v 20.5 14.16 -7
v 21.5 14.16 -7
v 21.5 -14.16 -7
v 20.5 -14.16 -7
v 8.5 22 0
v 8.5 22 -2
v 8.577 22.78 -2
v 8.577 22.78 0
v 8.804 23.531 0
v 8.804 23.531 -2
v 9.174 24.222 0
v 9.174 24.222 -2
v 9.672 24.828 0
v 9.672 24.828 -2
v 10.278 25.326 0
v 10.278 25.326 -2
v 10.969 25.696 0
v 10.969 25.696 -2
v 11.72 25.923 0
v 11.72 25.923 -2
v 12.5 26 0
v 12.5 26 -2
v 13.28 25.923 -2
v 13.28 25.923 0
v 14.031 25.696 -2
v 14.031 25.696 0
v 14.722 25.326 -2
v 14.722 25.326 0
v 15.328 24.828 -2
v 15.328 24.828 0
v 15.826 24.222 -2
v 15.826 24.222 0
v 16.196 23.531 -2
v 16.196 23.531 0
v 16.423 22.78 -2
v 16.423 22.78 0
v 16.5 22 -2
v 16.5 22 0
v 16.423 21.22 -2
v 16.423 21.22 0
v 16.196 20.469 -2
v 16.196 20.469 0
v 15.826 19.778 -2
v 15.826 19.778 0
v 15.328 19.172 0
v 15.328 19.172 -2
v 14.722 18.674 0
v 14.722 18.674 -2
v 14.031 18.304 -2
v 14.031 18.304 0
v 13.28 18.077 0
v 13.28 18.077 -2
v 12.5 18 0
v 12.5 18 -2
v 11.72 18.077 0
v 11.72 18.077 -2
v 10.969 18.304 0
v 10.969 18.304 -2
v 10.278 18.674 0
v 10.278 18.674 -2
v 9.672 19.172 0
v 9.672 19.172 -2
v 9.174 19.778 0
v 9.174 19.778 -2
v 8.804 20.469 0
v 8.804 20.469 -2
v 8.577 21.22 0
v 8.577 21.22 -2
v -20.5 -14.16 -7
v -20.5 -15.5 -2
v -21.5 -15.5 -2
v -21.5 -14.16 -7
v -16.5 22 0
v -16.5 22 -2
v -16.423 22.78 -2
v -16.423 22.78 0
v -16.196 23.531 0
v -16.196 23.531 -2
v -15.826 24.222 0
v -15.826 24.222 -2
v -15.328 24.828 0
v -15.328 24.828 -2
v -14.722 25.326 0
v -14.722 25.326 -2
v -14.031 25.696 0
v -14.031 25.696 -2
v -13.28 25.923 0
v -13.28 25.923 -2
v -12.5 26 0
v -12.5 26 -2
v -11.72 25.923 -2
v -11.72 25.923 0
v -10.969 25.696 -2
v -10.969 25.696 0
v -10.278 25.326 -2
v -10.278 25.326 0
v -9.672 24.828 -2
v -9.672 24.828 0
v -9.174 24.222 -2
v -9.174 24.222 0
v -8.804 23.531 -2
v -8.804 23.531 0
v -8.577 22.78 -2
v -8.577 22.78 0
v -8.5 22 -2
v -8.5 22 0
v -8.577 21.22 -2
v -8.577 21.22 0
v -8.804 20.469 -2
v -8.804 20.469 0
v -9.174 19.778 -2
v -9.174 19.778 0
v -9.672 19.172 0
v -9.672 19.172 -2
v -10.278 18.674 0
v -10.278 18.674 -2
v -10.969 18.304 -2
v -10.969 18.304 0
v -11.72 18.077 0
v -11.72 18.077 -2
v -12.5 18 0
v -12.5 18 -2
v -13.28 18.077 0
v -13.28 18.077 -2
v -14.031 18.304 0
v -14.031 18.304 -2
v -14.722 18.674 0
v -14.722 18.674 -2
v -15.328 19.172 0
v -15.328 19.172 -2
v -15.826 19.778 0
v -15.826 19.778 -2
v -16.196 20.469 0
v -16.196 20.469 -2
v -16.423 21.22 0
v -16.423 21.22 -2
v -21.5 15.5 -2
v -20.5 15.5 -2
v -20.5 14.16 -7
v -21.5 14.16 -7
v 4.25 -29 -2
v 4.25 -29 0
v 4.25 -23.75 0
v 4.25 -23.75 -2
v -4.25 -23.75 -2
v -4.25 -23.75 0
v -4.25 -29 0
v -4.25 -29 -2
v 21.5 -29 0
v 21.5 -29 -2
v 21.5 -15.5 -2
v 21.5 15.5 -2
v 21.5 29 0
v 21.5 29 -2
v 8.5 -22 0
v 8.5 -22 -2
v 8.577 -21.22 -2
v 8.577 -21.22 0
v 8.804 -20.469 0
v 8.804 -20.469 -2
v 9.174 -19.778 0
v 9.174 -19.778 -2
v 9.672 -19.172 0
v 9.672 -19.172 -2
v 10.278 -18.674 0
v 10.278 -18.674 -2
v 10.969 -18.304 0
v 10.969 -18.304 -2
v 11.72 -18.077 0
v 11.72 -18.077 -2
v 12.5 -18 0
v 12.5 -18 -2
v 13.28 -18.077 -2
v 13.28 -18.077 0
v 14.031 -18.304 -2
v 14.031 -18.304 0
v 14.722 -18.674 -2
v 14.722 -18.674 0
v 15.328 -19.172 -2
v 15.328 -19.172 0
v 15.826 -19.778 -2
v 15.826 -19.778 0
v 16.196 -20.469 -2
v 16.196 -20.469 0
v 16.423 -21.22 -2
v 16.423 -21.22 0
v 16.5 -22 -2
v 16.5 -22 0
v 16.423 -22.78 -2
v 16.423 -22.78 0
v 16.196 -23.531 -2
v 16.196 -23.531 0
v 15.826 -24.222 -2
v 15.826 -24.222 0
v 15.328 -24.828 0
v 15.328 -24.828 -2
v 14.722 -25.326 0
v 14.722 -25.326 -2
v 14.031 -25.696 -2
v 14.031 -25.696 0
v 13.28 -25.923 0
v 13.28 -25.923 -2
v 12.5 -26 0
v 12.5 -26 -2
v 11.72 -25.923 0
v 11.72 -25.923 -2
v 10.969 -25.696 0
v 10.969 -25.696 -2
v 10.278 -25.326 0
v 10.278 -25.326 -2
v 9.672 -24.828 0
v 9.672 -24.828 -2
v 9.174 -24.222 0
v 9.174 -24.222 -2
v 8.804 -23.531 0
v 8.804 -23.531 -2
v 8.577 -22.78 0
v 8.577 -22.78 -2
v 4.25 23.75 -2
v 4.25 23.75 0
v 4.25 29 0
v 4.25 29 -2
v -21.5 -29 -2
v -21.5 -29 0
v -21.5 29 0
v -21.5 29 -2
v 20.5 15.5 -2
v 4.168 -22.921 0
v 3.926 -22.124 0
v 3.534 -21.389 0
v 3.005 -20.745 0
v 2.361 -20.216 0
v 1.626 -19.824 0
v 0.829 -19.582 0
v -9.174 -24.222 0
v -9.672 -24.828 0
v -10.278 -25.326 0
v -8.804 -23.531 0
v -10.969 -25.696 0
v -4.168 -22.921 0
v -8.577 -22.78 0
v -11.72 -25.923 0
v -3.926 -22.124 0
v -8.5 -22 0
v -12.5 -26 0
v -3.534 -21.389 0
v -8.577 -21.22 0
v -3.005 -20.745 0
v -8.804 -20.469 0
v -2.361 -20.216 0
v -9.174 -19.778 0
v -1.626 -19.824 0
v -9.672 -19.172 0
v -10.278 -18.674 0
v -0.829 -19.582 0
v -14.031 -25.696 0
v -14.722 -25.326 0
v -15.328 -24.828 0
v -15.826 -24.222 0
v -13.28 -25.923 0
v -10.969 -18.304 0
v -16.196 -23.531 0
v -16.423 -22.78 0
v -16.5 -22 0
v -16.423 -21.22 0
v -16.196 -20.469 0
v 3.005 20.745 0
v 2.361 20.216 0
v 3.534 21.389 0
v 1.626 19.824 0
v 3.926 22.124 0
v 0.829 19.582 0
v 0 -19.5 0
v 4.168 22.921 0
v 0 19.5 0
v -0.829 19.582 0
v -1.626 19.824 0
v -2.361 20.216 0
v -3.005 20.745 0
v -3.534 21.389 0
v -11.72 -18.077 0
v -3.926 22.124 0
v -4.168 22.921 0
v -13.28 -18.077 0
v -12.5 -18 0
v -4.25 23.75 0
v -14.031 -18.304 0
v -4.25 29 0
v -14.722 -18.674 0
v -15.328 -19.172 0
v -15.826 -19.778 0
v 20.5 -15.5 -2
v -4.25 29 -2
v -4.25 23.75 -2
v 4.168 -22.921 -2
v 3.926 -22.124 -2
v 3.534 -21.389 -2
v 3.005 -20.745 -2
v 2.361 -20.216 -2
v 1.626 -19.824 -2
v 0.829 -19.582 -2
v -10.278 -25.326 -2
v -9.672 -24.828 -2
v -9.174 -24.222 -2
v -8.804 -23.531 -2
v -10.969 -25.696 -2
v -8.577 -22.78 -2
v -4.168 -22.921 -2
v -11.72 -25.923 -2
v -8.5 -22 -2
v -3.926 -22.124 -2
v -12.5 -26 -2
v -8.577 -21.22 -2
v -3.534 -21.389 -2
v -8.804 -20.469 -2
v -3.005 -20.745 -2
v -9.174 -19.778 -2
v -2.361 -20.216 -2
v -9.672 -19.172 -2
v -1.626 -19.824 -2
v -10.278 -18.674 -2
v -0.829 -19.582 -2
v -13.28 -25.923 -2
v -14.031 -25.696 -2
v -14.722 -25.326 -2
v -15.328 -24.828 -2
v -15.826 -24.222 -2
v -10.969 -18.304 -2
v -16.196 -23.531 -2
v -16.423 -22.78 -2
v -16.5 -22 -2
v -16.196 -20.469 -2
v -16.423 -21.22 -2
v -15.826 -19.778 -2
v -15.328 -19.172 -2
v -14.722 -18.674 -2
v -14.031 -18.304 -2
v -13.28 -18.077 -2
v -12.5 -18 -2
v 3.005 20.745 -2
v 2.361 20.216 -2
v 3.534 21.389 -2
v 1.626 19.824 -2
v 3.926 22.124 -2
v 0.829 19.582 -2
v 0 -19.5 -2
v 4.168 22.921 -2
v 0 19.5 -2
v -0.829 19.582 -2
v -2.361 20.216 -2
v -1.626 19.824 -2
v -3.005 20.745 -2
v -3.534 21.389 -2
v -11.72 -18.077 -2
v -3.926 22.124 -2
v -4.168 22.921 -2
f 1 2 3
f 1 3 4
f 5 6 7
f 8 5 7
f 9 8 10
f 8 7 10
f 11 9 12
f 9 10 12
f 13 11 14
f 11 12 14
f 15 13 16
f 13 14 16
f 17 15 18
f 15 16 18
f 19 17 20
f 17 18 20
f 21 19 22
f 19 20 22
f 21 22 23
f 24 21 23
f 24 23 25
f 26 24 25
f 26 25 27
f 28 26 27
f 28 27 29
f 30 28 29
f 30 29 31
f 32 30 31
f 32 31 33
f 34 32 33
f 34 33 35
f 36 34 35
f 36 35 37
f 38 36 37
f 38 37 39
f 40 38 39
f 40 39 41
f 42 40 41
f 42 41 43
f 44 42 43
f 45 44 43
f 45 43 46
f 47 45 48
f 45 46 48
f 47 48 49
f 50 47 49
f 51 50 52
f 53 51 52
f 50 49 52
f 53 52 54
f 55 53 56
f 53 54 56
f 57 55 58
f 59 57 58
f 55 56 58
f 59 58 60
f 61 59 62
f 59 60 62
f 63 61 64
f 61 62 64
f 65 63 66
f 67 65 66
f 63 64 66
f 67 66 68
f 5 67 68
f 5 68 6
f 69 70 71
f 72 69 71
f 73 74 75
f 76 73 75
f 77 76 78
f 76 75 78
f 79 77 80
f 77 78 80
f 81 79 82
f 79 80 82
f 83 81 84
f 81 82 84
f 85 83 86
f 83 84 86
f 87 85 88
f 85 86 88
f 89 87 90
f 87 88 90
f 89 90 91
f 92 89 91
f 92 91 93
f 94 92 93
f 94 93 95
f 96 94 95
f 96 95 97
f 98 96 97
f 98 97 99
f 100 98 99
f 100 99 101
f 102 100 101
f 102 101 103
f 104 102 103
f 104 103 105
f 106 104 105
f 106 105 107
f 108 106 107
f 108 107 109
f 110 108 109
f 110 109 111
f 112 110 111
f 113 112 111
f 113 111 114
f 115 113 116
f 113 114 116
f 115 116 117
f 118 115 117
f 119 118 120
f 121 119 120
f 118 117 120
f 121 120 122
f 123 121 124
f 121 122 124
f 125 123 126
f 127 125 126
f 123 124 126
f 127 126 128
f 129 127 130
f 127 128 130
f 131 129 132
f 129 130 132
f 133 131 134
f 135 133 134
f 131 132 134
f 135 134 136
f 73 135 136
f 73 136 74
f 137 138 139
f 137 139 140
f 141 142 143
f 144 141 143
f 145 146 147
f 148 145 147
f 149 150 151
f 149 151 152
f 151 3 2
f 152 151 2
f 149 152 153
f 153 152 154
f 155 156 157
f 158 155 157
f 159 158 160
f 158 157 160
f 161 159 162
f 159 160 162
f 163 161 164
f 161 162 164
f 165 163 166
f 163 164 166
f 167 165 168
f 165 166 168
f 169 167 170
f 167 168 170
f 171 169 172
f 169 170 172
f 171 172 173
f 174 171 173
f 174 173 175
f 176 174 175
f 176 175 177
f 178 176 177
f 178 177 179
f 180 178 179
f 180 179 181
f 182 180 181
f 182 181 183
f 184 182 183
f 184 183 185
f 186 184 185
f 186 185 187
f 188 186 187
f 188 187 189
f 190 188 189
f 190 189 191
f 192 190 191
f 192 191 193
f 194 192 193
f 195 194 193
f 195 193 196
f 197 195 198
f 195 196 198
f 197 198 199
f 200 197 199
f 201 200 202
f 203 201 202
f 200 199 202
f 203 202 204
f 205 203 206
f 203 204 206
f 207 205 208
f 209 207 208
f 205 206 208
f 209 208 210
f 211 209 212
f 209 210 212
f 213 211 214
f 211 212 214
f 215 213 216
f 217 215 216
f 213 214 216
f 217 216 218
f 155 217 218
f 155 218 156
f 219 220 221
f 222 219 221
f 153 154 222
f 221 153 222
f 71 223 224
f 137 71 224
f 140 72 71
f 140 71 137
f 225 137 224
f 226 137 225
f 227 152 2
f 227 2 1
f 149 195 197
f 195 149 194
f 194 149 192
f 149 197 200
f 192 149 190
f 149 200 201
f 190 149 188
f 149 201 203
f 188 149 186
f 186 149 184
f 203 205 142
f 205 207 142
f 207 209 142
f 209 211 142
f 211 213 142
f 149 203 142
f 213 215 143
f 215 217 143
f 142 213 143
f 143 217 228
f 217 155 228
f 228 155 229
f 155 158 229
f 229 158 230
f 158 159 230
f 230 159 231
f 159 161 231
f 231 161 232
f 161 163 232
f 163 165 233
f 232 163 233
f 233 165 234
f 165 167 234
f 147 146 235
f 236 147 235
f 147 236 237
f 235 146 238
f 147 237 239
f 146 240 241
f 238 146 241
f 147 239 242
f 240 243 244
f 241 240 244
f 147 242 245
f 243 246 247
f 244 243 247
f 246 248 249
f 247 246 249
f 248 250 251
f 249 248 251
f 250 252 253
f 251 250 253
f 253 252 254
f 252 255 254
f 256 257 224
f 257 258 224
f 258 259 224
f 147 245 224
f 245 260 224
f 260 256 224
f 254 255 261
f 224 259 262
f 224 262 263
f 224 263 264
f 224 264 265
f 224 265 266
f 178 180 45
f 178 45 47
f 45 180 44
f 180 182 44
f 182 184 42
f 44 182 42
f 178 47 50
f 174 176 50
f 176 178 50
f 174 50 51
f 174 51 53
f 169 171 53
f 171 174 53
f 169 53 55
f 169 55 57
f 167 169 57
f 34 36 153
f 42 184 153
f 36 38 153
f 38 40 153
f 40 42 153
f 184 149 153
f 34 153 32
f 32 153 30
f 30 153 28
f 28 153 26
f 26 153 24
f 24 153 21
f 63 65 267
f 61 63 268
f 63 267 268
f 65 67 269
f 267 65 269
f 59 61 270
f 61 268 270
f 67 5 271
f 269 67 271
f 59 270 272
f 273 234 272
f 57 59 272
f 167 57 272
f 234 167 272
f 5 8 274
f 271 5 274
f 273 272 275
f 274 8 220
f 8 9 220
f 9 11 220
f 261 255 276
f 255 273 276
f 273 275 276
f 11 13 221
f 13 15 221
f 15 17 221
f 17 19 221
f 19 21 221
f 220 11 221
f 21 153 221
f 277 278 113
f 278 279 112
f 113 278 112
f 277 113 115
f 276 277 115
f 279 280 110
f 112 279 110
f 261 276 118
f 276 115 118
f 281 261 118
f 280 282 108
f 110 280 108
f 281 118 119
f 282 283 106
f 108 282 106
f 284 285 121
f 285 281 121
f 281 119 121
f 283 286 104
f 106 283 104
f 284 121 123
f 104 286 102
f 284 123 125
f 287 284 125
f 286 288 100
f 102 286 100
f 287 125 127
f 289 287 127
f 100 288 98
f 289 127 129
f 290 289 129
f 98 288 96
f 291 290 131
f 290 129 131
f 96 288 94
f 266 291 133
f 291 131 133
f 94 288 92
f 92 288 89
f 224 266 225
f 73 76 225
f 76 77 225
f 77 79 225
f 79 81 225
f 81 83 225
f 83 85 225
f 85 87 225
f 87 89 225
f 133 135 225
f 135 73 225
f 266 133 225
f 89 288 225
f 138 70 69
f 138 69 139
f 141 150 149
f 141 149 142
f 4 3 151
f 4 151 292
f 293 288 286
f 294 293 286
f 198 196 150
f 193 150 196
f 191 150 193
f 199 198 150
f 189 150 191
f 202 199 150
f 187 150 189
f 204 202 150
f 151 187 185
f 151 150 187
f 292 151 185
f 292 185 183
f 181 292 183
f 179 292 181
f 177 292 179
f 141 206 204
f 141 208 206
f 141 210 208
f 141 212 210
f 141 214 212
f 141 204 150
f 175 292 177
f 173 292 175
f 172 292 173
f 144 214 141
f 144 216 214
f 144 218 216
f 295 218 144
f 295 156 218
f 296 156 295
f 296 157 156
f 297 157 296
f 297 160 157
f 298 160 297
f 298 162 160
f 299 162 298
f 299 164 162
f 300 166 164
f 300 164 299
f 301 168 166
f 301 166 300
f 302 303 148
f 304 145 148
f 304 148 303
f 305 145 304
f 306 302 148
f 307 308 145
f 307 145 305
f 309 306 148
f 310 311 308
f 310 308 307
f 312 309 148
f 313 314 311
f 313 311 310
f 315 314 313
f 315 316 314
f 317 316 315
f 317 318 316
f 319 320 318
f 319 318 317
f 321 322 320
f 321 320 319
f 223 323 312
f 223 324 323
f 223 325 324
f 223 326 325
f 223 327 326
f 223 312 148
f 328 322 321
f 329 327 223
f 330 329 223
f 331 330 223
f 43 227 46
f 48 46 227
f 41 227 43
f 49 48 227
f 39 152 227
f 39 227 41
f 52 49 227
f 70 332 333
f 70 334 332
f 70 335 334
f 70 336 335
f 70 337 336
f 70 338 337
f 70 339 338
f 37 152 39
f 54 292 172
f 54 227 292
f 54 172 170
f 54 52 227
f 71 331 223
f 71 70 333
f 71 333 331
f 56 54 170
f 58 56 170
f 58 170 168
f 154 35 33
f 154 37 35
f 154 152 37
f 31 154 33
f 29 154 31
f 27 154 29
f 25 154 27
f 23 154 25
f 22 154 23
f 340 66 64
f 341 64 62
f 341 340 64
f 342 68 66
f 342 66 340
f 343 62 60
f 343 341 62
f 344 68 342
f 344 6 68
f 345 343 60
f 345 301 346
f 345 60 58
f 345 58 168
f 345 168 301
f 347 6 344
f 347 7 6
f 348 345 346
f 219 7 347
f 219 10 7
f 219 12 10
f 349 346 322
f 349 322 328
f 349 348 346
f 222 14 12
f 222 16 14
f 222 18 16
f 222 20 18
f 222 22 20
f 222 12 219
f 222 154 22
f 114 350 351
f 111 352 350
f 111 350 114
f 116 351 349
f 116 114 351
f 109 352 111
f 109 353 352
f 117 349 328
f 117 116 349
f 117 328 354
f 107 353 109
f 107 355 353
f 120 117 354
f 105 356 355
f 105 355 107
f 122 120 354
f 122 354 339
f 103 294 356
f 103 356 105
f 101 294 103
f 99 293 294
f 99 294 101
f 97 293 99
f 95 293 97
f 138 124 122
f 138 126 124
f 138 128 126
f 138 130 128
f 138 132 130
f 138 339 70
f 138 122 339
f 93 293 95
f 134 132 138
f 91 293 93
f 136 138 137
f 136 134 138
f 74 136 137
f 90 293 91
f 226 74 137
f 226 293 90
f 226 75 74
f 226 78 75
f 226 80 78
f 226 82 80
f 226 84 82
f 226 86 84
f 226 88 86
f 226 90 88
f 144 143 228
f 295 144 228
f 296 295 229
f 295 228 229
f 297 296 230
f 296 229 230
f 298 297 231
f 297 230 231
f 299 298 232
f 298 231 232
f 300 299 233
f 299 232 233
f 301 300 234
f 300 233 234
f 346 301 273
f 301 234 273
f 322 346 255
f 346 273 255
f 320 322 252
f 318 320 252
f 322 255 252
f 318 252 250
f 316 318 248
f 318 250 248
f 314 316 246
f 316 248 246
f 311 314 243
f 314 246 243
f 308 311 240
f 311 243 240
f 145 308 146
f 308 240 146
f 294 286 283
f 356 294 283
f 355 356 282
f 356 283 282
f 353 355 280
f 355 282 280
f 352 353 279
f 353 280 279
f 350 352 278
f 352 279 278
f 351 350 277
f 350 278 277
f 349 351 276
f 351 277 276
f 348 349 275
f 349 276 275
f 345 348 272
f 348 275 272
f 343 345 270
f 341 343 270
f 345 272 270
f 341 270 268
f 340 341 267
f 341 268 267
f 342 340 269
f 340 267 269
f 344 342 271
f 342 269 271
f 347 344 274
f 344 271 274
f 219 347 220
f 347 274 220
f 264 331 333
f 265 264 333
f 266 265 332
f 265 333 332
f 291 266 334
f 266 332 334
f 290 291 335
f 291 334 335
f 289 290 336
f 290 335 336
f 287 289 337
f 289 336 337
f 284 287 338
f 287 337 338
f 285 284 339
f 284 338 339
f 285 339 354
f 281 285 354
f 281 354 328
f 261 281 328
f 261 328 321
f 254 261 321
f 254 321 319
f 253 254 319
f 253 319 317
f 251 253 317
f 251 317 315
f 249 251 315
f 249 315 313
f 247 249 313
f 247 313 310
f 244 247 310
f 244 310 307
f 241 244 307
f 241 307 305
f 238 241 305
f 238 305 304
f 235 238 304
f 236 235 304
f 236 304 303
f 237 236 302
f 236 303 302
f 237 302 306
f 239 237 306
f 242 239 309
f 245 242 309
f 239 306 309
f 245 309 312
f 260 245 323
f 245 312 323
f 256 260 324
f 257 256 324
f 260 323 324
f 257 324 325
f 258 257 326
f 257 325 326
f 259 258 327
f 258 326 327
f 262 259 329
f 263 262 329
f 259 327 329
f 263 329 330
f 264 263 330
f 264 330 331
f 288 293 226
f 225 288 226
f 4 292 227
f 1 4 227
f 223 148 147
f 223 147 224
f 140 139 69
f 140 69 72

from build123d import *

# Parameters (mm, degrees)
SKETCH1_W                    = 43
SKETCH1_H                    = 58
BOSS_EXTRUDE1_DEPTH          = 2
CUT_EXTRUDE1_DEPTH           = 3
CUT_EXTRUDE2_DEPTH           = 3
SKETCH4_W                    = 1
SKETCH4_H                    = 31
BOSS_EXTRUDE2_DEPTH          = 5
SKETCH5_W                    = 1
SKETCH5_H                    = 31
BOSS_EXTRUDE3_DEPTH          = 5
DRAFT1_ANGLE                 = 15
F_8_0_8_DIAMETER_HOLE1_D     = 8
F_8_0_8_DIAMETER_HOLE1_DEPTH = 7


with BuildPart() as part:
    # Sketch1 → Boss-Extrude1 (new body)
    with BuildSketch(Plane(origin=(0, 0, -2), x_dir=(-1, 0, 0), z_dir=(0, 0, -1))):
        Rectangle(SKETCH1_W, SKETCH1_H)
    extrude(amount=-BOSS_EXTRUDE1_DEPTH)

    # Sketch2 → Cut-Extrude1 (cut, through all)
    with BuildSketch(Plane.XY):
        with BuildLine():
            Line((4.25, 29), (-4.25, 29))
            Line((-4.25, 29), (-4.25, 23.75))
            ThreePointArc((-4.25, 23.75), (0, 19.5), (4.25, 23.75))
            Line((4.25, 23.75), (4.25, 29))
        make_face()
    extrude(amount=-CUT_EXTRUDE1_DEPTH, mode=Mode.SUBTRACT)

    # Sketch3 → Cut-Extrude2 (cut, through all)
    with BuildSketch(Plane.XY):
        with BuildLine():
            Line((-4.25, -29), (4.25, -29))
            Line((4.25, -29), (4.25, -23.75))
            ThreePointArc((4.25, -23.75), (0, -19.5), (-4.25, -23.75))
            Line((-4.25, -23.75), (-4.25, -29))
        make_face()
    extrude(amount=-CUT_EXTRUDE2_DEPTH, mode=Mode.SUBTRACT)

    # Sketch4 → Boss-Extrude2 (add)
    with BuildSketch(Plane(origin=(0, 0, -2), x_dir=(-1, 0, 0), z_dir=(0, 0, -1))):
        with Locations((-21, 0)):
            Rectangle(SKETCH4_W, SKETCH4_H)
    extrude(amount=BOSS_EXTRUDE2_DEPTH)

    # Sketch5 → Boss-Extrude3 (add)
    with BuildSketch(Plane(origin=(0, 0, -2), x_dir=(-1, 0, 0), z_dir=(0, 0, -1))):
        with Locations((21, 0)):
            Rectangle(SKETCH5_W, SKETCH5_H)
    extrude(amount=BOSS_EXTRUDE3_DEPTH)

    # Draft1
    draft1_faces = [part.faces().sort_by_distance(p)[0] for p in [
        (21, -15.5, -4.5),
        (21, 15.5, -4.5),
        (-21, 15.5, -4.5),
        (-21, -15.5, -4.5),
    ]]
    draft(draft1_faces, Plane(origin=(0, 0, -2), x_dir=(-1, 0, 0), z_dir=(0, 0, -1)), DRAFT1_ANGLE)

    # Ø8.0 (8) Diameter Hole1
    with Locations(Plane.XY):
        with Locations((12.5, 22), (-12.5, 22), (-12.5, -22), (12.5, -22)):
            Hole(F_8_0_8_DIAMETER_HOLE1_D / 2, depth=F_8_0_8_DIAMETER_HOLE1_DEPTH)


solid = part.part
